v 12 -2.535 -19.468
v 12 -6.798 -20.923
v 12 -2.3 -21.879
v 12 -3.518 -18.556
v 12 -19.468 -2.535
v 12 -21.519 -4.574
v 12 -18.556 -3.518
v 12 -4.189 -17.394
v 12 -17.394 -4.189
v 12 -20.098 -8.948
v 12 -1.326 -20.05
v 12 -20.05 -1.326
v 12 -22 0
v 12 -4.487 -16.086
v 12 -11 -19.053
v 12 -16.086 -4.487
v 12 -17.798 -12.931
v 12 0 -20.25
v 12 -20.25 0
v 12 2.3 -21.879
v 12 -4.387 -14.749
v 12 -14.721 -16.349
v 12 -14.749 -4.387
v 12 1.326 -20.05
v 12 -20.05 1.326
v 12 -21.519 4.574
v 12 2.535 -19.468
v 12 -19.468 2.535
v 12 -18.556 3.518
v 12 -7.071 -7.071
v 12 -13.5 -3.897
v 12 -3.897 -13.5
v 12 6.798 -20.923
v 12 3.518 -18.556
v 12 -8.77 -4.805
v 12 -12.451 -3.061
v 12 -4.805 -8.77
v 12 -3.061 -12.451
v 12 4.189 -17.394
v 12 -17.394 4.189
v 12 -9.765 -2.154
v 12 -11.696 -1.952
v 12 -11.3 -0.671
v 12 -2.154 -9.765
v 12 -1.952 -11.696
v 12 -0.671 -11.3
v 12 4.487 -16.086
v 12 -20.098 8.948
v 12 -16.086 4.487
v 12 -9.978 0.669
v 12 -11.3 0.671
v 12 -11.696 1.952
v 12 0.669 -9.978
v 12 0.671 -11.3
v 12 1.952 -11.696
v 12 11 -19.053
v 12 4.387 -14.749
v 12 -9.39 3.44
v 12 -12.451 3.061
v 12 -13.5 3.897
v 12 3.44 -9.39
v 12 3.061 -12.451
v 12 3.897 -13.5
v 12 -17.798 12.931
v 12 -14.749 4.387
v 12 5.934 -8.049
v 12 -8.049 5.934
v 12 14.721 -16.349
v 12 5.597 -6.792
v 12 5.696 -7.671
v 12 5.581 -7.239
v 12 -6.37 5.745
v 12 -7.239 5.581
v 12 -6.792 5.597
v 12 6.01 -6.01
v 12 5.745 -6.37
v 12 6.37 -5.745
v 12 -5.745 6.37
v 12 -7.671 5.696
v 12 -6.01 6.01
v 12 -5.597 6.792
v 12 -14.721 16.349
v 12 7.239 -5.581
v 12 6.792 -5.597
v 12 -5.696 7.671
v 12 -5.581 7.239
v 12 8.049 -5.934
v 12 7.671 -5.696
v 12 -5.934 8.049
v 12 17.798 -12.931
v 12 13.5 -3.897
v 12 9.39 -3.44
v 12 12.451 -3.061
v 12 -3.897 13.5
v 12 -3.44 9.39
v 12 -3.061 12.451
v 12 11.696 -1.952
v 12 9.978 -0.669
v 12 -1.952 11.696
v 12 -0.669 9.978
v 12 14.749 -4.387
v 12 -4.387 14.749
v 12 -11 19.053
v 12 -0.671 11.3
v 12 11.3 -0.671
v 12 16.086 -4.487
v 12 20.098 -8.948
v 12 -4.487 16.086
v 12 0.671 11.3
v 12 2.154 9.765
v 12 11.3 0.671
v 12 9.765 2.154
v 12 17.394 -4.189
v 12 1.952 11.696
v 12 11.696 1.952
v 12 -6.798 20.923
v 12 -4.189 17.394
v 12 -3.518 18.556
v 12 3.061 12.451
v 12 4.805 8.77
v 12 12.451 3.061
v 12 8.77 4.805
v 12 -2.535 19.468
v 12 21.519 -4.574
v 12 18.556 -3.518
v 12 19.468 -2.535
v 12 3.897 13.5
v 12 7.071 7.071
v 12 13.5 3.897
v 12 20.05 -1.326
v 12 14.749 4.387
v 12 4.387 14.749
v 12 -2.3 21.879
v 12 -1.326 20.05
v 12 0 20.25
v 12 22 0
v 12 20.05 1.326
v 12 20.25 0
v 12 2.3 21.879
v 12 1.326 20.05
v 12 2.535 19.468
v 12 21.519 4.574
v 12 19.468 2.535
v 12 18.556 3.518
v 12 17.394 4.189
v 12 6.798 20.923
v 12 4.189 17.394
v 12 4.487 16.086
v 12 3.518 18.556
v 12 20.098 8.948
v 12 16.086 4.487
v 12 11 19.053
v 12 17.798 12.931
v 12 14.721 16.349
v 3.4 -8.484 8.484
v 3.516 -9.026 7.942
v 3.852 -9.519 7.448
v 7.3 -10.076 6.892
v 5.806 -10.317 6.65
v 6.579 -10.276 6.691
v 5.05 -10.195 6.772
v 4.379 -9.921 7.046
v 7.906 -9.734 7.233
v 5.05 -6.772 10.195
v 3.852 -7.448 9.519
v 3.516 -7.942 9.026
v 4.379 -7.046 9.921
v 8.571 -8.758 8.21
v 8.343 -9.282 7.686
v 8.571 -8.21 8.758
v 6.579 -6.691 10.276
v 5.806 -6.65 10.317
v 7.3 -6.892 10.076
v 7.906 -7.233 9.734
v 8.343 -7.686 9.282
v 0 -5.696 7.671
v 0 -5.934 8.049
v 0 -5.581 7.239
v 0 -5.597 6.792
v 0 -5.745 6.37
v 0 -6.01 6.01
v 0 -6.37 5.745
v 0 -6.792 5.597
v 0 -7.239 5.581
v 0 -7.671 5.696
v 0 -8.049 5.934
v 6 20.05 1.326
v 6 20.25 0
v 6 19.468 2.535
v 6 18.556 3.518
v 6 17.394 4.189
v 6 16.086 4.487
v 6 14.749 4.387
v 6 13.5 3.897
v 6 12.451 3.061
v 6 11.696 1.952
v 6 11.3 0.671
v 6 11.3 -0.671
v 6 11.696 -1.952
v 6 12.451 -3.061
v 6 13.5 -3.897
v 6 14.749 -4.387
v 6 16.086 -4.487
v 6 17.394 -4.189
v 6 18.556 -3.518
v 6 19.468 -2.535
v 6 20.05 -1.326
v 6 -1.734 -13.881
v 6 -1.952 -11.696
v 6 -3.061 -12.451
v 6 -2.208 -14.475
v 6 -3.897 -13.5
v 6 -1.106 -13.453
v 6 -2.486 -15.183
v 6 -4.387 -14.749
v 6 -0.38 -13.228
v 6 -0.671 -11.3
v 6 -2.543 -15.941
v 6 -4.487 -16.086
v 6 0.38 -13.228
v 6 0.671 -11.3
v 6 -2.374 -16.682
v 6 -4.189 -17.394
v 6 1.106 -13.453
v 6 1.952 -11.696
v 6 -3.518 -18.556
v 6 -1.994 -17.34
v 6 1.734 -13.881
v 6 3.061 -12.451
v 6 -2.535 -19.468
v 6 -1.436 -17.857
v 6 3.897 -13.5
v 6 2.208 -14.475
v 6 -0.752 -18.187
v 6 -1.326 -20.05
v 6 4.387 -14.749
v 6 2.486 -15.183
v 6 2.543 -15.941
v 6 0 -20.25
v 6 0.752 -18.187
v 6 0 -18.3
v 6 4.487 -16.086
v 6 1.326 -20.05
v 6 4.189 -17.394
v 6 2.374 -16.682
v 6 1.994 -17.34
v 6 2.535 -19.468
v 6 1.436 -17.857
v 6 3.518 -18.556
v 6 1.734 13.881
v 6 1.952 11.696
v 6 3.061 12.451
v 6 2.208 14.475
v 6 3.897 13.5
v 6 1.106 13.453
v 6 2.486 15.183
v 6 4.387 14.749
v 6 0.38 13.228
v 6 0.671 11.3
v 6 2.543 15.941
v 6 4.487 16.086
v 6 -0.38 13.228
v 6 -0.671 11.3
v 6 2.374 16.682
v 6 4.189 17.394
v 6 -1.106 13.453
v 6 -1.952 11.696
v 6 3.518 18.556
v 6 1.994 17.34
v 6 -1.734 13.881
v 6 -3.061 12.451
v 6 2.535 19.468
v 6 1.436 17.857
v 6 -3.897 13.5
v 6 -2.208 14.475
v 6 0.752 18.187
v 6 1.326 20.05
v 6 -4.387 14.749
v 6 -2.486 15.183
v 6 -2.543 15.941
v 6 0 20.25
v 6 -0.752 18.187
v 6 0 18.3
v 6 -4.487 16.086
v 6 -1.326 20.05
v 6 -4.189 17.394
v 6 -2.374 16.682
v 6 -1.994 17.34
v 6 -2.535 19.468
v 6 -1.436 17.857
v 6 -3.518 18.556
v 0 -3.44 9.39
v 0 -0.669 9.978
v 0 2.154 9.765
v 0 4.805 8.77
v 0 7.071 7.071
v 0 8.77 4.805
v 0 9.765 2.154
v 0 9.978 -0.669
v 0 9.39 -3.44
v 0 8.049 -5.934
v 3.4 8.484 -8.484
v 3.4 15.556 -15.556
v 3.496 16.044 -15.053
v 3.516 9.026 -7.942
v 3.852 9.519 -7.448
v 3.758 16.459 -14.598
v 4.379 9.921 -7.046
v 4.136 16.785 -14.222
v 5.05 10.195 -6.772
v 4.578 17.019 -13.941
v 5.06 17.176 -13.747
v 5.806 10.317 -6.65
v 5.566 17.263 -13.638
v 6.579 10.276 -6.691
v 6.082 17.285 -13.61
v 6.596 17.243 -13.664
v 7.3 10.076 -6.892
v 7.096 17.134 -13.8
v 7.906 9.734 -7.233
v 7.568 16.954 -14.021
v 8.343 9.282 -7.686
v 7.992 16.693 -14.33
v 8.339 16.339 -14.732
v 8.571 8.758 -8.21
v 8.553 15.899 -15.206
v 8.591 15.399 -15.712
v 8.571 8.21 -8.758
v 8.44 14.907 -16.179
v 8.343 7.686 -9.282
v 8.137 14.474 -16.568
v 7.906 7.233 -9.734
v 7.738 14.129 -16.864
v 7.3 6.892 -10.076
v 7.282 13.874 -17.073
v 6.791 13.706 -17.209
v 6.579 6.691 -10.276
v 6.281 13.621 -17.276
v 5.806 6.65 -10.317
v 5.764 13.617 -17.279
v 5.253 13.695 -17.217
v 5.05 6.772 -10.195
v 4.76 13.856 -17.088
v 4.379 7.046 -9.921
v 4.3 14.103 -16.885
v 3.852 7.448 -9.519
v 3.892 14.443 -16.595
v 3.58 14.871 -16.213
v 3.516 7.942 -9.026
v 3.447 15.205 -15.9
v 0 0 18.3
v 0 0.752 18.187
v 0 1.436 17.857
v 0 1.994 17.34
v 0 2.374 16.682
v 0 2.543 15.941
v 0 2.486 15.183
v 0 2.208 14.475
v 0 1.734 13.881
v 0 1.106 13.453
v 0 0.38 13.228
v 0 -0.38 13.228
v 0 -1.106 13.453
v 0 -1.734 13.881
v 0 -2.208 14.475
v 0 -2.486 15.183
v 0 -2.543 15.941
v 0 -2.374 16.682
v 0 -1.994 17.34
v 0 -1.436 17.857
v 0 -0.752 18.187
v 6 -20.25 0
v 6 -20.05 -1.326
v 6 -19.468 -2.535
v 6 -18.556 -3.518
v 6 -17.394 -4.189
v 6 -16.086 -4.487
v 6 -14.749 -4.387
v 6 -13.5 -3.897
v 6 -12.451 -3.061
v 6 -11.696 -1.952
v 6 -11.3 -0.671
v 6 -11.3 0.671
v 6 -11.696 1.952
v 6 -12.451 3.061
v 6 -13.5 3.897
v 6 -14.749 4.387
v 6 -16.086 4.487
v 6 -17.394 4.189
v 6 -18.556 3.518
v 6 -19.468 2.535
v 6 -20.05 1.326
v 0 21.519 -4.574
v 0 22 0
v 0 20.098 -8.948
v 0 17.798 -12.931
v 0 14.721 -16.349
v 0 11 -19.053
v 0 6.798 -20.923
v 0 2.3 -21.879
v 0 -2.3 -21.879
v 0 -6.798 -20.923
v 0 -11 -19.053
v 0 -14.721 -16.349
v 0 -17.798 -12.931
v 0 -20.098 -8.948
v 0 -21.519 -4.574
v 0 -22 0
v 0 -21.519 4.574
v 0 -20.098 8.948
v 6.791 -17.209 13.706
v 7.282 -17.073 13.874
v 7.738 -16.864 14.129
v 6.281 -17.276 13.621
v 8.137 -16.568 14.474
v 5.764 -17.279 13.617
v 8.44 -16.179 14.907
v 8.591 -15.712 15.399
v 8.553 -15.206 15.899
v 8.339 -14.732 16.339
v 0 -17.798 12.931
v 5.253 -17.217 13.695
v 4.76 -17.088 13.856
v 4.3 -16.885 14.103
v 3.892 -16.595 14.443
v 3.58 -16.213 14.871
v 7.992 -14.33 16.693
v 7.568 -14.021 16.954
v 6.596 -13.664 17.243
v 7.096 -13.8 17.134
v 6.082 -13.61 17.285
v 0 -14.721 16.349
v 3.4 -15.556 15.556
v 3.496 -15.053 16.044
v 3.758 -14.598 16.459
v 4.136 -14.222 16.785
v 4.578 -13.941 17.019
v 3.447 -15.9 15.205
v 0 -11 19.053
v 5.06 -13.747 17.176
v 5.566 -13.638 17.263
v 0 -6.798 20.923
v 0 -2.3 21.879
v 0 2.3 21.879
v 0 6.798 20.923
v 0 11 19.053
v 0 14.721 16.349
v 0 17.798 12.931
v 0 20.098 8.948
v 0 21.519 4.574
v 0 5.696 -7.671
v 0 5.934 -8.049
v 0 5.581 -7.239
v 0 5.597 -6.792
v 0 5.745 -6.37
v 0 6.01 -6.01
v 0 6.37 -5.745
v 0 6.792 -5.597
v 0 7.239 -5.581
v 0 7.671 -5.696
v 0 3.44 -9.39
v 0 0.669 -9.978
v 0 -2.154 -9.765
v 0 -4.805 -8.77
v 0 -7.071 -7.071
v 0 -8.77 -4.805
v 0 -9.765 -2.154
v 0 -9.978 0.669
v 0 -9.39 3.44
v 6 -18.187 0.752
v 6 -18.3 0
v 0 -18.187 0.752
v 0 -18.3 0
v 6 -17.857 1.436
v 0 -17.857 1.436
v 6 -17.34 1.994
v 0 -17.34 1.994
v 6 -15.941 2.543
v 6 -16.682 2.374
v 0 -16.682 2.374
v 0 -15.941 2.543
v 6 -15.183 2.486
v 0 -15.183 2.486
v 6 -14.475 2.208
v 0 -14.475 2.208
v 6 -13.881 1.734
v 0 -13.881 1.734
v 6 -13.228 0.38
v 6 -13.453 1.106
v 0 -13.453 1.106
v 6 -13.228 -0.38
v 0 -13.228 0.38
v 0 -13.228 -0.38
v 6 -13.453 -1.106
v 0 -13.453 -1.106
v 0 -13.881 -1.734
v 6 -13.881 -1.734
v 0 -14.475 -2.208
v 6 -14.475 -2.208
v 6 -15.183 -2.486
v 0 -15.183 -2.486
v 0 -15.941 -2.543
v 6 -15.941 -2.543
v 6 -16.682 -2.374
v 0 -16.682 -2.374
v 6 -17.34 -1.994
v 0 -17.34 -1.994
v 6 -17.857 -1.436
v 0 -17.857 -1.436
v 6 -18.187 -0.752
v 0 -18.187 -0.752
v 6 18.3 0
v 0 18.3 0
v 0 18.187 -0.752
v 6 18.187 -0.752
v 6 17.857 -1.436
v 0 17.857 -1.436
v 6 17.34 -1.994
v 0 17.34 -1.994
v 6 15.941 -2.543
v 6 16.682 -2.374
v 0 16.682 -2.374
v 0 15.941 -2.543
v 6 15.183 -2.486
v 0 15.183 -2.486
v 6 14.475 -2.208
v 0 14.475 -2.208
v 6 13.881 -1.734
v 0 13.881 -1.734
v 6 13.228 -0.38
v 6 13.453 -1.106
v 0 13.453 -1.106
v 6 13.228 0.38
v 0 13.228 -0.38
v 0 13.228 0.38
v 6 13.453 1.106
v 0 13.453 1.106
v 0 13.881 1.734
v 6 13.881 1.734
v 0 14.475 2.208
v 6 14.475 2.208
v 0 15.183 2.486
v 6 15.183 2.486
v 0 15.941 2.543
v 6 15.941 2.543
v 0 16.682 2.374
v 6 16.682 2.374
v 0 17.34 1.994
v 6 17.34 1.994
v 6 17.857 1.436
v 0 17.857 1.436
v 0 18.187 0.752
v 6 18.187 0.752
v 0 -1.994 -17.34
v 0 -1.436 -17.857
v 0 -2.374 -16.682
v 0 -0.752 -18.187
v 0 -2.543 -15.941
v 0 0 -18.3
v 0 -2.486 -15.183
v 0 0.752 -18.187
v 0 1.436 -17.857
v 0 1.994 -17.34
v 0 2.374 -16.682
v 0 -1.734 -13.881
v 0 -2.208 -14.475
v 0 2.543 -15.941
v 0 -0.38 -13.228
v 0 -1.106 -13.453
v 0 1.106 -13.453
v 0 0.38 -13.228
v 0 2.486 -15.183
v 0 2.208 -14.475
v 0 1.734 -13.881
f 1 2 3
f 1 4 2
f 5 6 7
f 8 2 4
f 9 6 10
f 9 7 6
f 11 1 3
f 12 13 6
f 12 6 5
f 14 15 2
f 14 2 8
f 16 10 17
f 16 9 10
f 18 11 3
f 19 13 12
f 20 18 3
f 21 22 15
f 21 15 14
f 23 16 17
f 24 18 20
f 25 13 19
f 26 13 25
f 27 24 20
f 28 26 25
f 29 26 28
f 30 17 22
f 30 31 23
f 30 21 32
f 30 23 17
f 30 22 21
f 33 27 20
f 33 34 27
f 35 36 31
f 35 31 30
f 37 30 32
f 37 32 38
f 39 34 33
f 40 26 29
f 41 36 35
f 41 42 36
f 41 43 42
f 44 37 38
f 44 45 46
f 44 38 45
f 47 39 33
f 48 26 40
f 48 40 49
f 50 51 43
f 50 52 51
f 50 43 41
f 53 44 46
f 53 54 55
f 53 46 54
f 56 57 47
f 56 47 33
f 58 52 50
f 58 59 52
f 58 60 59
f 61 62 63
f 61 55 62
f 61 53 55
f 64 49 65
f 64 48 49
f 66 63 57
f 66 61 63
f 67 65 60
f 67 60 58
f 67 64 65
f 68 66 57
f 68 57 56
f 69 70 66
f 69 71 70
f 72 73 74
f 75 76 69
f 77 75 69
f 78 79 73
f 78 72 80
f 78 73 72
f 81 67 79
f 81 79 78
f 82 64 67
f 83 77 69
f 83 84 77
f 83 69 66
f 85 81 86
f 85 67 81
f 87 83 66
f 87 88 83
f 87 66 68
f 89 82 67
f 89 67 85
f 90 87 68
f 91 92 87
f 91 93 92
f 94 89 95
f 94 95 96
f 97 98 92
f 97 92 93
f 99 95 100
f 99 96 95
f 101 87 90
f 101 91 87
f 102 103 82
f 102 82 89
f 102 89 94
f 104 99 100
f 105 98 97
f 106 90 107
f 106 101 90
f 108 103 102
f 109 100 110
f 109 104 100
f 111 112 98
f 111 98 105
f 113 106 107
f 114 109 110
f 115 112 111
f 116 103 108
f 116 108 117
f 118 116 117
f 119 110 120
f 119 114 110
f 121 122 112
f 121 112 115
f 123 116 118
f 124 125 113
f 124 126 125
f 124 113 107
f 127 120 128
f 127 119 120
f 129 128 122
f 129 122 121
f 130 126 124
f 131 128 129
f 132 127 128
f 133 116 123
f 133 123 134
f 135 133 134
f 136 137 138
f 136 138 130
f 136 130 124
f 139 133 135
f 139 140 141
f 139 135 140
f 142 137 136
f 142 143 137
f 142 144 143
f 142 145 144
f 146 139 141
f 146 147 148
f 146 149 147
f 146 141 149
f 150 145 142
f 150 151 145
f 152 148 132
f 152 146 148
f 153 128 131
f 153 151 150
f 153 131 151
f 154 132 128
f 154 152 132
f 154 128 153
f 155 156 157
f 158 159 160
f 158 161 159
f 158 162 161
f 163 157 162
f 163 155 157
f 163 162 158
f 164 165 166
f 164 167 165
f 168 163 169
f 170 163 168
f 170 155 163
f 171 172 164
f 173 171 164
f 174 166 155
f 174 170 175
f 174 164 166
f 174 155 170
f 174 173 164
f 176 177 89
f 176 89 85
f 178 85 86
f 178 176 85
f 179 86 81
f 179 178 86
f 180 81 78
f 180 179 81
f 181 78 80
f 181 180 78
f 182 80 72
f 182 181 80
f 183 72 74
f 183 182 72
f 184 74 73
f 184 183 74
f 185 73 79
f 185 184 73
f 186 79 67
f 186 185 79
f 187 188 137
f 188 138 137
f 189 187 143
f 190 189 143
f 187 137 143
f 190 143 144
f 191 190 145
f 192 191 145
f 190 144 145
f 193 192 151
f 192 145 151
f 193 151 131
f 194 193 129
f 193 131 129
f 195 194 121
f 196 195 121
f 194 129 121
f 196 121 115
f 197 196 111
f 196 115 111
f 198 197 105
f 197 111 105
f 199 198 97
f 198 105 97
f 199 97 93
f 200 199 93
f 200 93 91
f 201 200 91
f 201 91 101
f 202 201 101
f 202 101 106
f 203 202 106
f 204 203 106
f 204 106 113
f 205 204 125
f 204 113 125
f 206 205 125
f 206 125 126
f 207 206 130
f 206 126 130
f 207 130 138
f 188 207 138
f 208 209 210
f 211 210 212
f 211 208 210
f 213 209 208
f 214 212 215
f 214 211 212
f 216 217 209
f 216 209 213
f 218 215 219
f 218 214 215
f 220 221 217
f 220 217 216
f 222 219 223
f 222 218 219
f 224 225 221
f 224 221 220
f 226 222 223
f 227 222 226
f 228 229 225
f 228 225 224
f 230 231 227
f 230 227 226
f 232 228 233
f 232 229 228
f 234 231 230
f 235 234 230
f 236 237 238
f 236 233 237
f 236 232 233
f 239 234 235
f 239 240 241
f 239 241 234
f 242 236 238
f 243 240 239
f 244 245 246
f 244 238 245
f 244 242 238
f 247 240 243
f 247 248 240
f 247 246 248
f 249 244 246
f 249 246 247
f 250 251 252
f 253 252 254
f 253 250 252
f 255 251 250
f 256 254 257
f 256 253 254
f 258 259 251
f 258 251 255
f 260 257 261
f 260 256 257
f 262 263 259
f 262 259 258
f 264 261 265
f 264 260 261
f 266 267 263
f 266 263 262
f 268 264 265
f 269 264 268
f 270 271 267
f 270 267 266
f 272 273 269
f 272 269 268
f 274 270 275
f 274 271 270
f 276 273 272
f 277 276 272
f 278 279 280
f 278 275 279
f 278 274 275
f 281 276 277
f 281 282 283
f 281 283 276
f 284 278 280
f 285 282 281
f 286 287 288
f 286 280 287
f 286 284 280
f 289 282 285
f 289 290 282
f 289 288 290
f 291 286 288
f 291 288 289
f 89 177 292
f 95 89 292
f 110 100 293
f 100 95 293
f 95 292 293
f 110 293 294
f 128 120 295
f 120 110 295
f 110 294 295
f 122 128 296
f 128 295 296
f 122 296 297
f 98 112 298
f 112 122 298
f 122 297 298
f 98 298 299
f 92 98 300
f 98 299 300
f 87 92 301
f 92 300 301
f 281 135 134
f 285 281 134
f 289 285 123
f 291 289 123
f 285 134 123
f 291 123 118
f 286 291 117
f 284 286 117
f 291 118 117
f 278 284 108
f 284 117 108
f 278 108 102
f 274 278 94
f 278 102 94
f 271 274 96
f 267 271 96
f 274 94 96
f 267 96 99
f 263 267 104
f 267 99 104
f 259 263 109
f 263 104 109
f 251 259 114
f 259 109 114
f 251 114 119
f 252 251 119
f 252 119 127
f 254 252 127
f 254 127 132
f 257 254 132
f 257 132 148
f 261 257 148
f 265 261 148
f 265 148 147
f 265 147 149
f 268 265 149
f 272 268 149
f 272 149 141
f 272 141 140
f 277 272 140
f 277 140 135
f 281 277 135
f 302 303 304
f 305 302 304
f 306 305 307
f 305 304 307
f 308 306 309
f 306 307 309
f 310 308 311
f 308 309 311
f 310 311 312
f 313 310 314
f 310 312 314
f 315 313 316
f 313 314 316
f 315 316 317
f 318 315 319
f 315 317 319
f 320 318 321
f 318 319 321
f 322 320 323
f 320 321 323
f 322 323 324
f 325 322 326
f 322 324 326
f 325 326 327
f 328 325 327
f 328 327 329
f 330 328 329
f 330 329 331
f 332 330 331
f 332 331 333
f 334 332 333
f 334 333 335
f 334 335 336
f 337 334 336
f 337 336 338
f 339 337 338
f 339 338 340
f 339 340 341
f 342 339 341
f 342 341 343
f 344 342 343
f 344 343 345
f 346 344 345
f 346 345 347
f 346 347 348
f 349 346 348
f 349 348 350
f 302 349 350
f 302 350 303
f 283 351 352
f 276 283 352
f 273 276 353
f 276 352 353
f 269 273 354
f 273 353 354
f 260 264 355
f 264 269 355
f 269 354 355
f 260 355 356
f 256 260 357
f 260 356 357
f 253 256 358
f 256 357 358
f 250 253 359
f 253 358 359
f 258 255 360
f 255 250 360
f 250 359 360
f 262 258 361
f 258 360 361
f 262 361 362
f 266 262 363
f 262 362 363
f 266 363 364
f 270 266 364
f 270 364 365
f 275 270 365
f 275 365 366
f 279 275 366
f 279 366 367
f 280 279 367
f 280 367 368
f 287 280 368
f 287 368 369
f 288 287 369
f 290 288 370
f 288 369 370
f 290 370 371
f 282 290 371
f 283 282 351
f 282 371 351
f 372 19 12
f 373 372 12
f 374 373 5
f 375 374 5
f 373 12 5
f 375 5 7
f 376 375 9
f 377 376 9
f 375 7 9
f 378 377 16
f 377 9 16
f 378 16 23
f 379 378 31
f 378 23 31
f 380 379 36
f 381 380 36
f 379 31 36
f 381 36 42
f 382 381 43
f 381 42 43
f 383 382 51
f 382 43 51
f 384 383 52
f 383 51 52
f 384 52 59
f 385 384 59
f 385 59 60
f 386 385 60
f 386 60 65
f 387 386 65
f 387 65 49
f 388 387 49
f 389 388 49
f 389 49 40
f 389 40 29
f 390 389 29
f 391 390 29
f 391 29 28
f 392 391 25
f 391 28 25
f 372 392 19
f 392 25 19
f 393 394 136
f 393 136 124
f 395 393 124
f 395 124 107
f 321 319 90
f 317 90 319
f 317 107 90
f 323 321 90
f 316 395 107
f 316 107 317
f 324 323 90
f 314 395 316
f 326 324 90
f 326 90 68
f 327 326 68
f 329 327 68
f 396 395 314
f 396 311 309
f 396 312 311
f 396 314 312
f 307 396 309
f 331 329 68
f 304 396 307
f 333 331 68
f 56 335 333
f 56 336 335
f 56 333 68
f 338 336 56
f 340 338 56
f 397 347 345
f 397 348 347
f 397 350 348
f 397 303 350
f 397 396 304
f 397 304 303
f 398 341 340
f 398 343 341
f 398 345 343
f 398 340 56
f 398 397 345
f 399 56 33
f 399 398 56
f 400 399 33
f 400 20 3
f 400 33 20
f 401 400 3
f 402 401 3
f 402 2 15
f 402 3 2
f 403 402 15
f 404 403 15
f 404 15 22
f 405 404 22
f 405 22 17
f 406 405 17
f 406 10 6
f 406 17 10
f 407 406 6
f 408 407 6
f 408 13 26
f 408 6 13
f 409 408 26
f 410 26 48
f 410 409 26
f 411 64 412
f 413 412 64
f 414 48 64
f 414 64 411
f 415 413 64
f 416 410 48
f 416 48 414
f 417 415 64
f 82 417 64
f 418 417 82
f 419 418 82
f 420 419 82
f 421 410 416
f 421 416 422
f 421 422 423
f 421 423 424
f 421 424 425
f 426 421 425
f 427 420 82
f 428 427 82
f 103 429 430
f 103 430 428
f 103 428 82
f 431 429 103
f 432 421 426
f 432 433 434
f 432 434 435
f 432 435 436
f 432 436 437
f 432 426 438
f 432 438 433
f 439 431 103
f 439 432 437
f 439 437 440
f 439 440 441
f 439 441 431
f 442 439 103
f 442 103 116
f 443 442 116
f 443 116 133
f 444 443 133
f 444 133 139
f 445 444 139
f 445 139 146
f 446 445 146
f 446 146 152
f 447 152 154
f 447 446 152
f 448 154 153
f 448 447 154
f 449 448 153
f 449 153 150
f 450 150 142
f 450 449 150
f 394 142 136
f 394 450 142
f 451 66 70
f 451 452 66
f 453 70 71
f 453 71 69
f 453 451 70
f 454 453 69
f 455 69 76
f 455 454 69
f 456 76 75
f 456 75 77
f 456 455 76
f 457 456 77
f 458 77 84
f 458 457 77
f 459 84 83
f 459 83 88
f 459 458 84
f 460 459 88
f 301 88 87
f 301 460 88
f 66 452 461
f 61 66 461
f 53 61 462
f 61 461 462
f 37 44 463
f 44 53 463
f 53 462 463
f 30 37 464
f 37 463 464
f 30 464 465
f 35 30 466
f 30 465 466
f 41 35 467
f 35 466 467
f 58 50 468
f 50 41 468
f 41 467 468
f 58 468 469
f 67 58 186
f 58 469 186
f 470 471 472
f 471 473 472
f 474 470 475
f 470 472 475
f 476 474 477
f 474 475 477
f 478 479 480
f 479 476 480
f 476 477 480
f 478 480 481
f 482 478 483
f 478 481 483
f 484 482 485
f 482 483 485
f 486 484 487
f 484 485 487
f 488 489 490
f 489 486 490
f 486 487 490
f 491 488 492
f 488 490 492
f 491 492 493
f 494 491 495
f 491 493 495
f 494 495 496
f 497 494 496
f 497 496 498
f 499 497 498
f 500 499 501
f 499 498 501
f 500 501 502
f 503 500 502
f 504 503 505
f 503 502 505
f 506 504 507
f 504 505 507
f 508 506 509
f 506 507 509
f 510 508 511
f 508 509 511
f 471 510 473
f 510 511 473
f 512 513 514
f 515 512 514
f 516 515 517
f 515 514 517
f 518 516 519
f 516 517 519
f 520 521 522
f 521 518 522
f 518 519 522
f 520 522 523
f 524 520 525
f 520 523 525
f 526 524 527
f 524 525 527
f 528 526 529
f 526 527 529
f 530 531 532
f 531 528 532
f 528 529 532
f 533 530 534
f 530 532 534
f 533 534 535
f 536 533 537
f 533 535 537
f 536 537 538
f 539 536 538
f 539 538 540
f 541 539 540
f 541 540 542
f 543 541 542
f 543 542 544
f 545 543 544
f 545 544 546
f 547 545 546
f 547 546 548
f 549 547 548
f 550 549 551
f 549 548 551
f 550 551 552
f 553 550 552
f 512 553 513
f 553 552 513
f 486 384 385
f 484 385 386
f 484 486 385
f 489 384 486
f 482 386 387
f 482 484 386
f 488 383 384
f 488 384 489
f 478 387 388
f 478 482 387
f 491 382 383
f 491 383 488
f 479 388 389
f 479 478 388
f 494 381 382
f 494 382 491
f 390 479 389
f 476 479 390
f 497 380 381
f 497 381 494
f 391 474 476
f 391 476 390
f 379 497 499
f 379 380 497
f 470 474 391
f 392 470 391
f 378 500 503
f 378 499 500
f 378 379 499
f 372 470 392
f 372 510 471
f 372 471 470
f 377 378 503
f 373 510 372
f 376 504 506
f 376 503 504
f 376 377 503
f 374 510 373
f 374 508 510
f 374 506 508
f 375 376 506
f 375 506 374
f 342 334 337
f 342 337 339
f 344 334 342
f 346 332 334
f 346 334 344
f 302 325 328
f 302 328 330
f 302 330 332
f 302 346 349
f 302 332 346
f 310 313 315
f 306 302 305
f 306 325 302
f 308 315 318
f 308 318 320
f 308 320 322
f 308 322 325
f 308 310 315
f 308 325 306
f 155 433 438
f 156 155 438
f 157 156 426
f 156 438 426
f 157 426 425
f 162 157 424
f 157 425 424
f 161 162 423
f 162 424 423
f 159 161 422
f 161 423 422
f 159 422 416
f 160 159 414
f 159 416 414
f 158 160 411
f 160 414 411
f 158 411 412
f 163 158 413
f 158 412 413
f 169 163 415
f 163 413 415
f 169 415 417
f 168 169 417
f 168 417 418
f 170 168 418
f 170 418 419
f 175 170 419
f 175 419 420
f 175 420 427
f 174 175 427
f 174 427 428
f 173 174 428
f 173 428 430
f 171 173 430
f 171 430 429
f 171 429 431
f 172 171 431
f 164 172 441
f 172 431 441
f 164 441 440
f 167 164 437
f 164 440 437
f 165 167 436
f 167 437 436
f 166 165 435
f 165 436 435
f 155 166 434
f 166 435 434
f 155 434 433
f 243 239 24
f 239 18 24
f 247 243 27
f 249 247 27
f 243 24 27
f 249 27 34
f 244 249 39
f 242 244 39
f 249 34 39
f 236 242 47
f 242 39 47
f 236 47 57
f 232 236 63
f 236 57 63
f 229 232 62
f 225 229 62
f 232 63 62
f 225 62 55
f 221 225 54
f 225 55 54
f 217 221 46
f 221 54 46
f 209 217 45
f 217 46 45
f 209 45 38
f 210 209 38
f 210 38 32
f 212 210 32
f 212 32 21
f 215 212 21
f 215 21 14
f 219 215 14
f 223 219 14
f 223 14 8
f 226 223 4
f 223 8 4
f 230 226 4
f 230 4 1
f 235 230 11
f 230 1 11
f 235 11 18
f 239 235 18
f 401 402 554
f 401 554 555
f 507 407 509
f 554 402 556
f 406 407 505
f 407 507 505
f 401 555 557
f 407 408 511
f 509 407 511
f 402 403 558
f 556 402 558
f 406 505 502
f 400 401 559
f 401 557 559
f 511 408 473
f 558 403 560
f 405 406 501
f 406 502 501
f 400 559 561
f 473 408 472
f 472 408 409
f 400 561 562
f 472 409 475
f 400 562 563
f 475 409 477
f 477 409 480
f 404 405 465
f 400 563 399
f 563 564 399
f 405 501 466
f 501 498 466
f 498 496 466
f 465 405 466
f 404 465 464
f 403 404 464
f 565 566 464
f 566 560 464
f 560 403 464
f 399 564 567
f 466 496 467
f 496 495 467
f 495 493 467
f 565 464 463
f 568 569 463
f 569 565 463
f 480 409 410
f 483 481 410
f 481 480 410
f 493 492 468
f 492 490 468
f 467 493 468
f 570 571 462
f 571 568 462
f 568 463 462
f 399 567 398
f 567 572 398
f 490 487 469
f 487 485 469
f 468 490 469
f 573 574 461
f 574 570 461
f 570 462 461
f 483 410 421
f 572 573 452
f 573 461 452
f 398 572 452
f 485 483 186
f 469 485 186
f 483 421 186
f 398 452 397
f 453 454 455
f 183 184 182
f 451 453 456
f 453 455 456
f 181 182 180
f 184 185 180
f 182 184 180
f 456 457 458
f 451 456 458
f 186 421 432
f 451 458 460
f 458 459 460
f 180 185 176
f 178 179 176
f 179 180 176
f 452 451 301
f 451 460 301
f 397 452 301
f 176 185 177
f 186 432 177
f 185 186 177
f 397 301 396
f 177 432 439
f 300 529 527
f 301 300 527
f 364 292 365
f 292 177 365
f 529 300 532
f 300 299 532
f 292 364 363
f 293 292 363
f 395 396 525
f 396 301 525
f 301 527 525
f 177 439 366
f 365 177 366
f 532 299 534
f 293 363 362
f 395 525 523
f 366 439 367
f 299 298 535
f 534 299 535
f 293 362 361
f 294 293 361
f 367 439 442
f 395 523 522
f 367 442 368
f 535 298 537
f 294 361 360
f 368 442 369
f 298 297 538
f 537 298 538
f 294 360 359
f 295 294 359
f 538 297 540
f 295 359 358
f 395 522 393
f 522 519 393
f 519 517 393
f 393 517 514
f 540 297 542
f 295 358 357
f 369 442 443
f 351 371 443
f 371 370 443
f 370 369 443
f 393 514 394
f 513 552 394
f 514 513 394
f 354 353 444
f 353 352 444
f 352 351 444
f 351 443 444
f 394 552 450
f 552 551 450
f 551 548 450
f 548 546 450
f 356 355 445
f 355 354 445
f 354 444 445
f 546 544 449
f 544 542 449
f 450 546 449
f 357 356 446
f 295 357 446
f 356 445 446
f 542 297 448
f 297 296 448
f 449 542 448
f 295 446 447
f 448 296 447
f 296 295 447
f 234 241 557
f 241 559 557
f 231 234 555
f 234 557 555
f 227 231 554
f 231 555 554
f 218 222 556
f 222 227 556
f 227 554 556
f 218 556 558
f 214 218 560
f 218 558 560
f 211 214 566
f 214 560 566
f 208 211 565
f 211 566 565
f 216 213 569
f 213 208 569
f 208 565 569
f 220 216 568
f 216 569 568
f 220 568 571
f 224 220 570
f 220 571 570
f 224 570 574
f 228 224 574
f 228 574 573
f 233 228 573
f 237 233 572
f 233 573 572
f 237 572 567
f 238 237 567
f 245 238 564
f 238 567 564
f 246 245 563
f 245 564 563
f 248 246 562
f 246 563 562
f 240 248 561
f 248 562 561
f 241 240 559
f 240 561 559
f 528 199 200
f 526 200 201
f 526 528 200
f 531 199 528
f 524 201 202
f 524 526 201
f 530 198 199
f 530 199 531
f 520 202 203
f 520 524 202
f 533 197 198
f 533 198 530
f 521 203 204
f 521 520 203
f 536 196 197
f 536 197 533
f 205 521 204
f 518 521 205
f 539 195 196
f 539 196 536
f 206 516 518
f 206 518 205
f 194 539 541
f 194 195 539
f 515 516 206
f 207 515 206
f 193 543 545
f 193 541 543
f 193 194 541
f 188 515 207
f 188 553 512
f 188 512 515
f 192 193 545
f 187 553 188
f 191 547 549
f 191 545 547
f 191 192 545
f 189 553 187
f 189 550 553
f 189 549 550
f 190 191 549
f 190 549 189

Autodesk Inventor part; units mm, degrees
ref_plane "YZ Plane" through (0, 0, 0) normal (1, 0, 0) x (0, 1, 0)
ref_plane "XZ Plane" through (0, 0, 0) normal (0, 1, 0) x (-1, 0, 0)
ref_plane "XY Plane" through (0, 0, 0) normal (0, 0, 1) x (1, 0, 0)
sketch "Sketch2" plane through (0, 0, 0) normal (1, 0, 0) x (0, 1, 0)
  circle A0 centre (0, 0) radius 10
  circle A1 centre (0, 0) radius 22
  line L0 (0, 0) -> (7.0711, -7.0711)
  line L1 (0, 0) -> (10, 0) construction
  circle A2 centre (7.0711, -7.0711) radius 1.5
  line L2 (0, 0) -> (10.8294, 10.8294)
  line L3 (0, 0) -> (15.315, 0) construction
  circle A3 centre (-7.0711, 7.0711) radius 1.5
  dimension "d3" = 20
  dimension "d4" = 44
  dimension "d16" = 10
  dimension "d17" = 45
  dimension "d18" = 3
  dimension "d19" = 45
extrude "Extrusion1" add sketch "Sketch2" along normal blind 12 contours A2 A0 | A0 L0 A2 | A3 A0 | A0 A3 | A0 A2 L0 | A1
sketch "Sketch4" plane through (0, 0, 0) normal (1, 0, 0) x (0, 0, -1)
  circle A0 centre (0, 0) radius 15.75
  circle A1 centre (15.75, 0) radius 2.55
  dimension "d9" = 31.5
  dimension "d10" = 5.1
extrude "Extrusion3" cut sketch "Sketch4" along normal blind 30 contours A0 A1 | A0 A1 picked at (14.9184, -0.4924) picked at (16.4994, -0.6699)
sketch "Sketch5" plane through (12, 0, 0) normal (1, 0, 0) x (0, 0, -1)
  circle A0 centre (15.75, 0) radius 2.55 projected
  circle A1 centre (15.75, 0) radius 4.5
  point P0 (0, 0)
  dimension "d20" = 9
extrude "Extrusion4" cut sketch "Sketch5" against normal blind 6
pattern_circular "Circular Pattern1" count 4 over 360 about axis through (-10, 0, 0) along (1, 0, 0) of "Extrusion3", "Extrusion4"
sketch "Sketch6" plane through (12, 0, 0) normal (1, 0, 0) x (0, 0, -1)
  line L0 (0, 0) -> (15.5563, 15.5563)
  line L1 (0, 0) -> (22, 0) construction
  dimension "d23" = 22
  dimension "d24" = 45
ref_plane "Work Plane1" through (12, 15.5563, -15.5563) normal (0, 0.7071, -0.7071) x (-1, 0, 0)
sketch "Sketch7" plane through (12, 15.5563, -15.5563) normal (0, 0.7071, -0.7071) x (-1, 0, 0)
  line L0 (0, 22) -> (0, -22) projected
  line L1 (0, 0) -> (12, 0)
  circle A0 centre (6, 0) radius 2.6
  dimension "d25" = 5.2
extrude "Extrusion5" cut sketch "Sketch7" against normal blind 10
ref_plane "Work Plane2" through (12, 0, 0) normal (0, 0.7071, -0.7071) x (-1, 0, 0)
thread "Thread1" size "M5x0.8" class "6H" standard "ANSI Metric M Profile" full length
mirror "Mirror1" about plane through (12, 0, 0) normal (0, 0.7071, -0.7071) of "Extrusion5"
properties part number "Pen Holder Interface"
